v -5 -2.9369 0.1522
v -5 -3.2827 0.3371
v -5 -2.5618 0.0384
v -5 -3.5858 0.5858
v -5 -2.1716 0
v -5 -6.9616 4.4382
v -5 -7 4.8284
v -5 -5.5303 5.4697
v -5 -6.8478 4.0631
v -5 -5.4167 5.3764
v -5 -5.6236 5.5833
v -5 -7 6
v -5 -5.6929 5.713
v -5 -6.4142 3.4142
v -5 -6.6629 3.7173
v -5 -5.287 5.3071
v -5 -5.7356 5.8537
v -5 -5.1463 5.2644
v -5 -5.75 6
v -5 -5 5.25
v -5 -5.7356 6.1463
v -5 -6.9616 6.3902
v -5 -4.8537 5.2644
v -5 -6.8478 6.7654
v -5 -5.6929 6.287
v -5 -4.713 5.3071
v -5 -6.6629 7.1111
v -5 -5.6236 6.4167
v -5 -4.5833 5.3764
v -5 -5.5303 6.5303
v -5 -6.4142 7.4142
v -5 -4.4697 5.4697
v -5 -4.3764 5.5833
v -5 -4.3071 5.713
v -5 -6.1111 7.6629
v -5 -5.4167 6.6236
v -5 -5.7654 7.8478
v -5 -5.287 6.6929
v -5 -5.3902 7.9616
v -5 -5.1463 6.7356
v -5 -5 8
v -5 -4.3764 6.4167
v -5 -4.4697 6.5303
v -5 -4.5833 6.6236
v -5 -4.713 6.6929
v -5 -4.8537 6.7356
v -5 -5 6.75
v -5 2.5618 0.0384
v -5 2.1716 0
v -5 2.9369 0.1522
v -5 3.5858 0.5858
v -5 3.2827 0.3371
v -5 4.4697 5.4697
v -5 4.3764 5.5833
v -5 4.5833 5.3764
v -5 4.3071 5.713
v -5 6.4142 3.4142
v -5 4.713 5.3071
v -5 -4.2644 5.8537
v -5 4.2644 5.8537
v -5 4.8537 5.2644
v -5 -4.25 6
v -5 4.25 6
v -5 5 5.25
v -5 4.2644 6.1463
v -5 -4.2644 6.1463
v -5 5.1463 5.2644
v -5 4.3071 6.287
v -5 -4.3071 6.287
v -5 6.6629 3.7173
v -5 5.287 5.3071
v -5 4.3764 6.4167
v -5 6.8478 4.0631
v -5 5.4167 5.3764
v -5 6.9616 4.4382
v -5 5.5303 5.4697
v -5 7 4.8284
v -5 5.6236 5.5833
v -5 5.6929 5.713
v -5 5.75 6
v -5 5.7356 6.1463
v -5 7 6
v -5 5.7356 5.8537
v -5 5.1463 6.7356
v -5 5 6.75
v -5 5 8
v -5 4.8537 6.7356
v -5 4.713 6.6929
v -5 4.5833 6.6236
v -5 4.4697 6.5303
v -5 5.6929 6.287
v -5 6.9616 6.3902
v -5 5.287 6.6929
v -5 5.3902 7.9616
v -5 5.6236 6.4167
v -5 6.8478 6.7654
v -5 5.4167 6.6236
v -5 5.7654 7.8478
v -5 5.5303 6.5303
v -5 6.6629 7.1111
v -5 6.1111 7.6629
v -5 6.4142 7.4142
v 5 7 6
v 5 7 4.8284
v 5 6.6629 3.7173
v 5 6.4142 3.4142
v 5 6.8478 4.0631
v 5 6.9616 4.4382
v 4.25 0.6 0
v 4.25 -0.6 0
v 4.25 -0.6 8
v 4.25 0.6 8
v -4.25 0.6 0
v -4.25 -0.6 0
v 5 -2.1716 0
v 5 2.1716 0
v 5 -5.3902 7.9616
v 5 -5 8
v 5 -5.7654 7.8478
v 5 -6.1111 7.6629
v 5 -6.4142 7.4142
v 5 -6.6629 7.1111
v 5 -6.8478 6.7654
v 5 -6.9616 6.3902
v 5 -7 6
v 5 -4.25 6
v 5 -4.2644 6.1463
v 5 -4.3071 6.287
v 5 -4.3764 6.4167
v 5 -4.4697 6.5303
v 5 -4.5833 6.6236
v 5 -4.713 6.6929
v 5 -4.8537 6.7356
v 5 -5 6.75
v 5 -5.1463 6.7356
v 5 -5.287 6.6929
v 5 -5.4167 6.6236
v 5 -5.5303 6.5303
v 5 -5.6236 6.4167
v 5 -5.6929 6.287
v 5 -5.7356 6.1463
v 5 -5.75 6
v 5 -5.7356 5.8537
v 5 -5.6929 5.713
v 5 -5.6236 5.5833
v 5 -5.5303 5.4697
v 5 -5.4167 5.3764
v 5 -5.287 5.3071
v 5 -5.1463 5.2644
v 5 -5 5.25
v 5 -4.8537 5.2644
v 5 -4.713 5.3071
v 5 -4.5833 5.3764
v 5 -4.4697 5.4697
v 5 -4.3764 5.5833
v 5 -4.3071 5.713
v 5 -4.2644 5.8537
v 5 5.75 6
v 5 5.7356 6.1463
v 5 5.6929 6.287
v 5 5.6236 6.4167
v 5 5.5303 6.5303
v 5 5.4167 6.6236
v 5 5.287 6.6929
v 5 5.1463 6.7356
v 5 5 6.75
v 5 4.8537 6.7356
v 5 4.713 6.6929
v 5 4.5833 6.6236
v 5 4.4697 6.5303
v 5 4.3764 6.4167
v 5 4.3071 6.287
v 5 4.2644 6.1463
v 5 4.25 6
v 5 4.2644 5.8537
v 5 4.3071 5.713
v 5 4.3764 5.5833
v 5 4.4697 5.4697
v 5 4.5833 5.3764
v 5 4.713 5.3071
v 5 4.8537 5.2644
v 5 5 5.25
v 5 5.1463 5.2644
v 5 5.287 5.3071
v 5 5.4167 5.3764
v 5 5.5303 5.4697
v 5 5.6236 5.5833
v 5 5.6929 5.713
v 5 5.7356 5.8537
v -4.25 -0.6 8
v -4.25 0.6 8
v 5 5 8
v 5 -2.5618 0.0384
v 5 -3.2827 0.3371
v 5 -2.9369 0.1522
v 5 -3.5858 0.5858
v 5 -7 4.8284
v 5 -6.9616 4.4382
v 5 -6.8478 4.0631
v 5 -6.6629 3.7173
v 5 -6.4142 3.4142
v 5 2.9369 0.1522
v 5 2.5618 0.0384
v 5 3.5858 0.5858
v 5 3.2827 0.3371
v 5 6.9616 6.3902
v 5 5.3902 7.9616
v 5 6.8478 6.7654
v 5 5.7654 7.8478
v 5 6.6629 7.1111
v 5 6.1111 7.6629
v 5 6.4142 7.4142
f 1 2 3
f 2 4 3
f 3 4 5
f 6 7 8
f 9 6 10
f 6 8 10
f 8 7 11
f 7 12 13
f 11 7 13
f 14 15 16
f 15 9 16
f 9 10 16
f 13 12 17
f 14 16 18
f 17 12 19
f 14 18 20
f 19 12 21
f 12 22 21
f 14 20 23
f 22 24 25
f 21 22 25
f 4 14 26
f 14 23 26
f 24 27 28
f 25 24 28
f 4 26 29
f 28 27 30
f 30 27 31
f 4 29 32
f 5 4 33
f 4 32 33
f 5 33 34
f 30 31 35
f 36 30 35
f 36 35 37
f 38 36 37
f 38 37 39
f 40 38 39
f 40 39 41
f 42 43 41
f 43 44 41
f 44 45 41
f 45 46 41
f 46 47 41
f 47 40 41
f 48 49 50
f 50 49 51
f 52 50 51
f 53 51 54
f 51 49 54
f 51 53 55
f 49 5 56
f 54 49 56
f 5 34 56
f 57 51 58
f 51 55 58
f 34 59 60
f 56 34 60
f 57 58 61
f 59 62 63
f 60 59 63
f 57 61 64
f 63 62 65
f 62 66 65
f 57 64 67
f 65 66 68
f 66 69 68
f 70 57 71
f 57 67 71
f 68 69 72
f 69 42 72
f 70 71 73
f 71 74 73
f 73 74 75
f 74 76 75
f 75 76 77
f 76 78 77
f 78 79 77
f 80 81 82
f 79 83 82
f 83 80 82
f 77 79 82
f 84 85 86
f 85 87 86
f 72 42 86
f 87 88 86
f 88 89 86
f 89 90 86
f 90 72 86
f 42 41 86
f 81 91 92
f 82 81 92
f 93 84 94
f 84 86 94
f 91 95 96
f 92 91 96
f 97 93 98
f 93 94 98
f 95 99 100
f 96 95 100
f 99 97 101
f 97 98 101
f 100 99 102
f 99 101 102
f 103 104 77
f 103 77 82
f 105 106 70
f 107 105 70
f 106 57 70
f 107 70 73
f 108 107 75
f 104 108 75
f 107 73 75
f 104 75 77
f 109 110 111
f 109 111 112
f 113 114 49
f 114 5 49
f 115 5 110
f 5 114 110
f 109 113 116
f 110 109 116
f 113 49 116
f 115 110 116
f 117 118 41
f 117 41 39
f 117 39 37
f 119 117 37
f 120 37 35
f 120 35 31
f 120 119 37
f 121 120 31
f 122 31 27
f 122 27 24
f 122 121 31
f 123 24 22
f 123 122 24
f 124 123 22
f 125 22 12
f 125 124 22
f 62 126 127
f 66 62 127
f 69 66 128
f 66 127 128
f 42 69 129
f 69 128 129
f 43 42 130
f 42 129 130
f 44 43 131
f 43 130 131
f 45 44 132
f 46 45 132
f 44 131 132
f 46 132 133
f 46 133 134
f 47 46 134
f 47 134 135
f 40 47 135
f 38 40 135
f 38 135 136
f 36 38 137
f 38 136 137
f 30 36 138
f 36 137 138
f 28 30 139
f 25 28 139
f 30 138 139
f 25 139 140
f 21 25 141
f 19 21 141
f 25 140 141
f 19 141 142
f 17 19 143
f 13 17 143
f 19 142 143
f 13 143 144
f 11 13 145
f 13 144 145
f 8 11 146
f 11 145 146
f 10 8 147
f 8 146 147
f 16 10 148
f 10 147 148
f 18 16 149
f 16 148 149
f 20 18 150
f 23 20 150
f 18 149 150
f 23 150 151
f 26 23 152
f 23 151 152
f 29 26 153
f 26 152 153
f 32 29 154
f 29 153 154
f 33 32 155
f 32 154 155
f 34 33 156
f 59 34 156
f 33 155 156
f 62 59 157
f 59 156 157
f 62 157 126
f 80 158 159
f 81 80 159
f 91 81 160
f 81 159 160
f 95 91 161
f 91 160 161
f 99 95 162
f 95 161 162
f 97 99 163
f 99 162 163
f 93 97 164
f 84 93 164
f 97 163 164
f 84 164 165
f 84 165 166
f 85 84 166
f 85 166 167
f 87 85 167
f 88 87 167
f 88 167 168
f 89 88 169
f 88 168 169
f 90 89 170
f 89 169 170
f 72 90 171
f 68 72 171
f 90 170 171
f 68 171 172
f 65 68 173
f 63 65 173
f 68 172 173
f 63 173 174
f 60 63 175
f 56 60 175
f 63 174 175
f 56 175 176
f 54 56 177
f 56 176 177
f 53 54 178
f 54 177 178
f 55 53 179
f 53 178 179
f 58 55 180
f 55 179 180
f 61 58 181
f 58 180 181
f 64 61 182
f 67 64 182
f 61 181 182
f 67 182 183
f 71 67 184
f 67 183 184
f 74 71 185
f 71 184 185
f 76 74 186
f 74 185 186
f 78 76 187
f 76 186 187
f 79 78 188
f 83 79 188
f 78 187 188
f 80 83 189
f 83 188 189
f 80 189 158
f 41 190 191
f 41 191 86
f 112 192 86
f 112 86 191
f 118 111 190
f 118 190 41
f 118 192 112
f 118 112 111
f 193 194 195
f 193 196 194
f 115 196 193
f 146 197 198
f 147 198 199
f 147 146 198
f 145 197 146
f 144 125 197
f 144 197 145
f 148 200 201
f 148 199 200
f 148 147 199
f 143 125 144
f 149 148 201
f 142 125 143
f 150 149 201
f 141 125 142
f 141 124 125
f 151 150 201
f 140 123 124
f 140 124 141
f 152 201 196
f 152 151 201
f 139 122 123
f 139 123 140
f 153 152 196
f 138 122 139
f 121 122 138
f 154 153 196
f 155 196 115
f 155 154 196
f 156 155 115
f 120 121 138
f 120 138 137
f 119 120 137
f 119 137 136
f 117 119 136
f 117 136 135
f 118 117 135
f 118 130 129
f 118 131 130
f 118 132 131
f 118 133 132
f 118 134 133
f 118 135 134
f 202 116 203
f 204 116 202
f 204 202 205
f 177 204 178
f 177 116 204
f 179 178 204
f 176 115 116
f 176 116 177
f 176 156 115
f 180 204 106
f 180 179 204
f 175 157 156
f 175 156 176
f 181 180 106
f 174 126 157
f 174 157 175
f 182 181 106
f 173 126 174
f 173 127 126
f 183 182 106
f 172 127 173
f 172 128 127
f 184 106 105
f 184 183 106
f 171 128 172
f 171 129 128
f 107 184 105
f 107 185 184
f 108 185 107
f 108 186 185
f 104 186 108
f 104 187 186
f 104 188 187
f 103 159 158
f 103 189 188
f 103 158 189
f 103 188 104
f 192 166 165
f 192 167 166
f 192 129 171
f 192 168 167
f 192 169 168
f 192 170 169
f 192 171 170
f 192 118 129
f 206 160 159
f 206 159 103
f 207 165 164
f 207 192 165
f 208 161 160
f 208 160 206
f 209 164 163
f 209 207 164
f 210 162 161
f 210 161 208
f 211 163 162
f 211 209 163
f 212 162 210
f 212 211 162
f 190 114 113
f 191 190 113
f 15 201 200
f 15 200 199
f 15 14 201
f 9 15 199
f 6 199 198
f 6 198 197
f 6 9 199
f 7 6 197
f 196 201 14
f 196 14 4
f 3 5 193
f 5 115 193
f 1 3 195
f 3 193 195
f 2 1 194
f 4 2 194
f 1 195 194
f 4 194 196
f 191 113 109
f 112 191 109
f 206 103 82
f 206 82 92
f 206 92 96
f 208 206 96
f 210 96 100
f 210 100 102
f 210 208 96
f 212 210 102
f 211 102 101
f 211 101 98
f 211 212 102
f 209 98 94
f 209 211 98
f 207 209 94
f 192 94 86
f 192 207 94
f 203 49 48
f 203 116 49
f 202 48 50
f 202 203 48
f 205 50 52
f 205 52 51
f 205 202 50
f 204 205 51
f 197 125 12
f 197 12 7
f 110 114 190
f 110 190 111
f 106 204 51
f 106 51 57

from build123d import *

# Parameters (mm, degrees)
F0_W     = 10
F0_H     = 6
F0_W_2   = 8.5
F0_H_2   = 1.2
F1_DEPTH = 8
F2_R     = 0.75
F3_DEPTH = 10
F5_R     = 2


with BuildPart() as f1:
    # F0 (on Top) → F1 (new body)
    with BuildSketch(Plane.XY):
        Rectangle(F0_W, F0_H)
        Rectangle(F0_W_2, F0_H_2, mode=Mode.SUBTRACT)
    extrude(amount=F1_DEPTH)


with BuildPart() as f3:
    # F2 (on face) → F3 (new body)
    with BuildSketch(Plane.YZ.offset(5)):
        with BuildLine():
            Line((-3, 4), (-3, 8))
            Line((-3, 8), (-5, 8))
            ThreePointArc((-5, 8), (-6.414214, 7.414214), (-7, 6))
            Line((-7, 6), (-7, 4))
            Line((-7, 4), (-3, 4))
        make_face()
        with Locations((-5, 6)):
            Circle(F2_R, mode=Mode.SUBTRACT)
        Polygon((-3, 0), (-3, 4), (-7, 4), align=None)
        with BuildLine():
            Line((5, 8), (3, 8))
            Line((3, 8), (3, 4))
            Line((3, 4), (7, 4))
            Line((7, 4), (7, 6))
            ThreePointArc((7, 6), (6.414214, 7.414214), (5, 8))
        make_face()
        with Locations((5, 6)):
            Circle(F2_R, mode=Mode.SUBTRACT)
        Polygon((7, 4), (3, 4), (3, 0), align=None)
    extrude(amount=-F3_DEPTH)


with BuildPart() as f1_1:
    add(f1.part)

    # F4: union F3
    add(f3.part)

    # F5
    f5_edges = [f1_1.edges().sort_by_distance(p)[0] for p in [
        (0, 3, 0),
        (0, 7, 4),
        (0, -3, 0),
        (0, -7, 4),
    ]]
    fillet(f5_edges, radius=F5_R)


solid = f1_1.part
